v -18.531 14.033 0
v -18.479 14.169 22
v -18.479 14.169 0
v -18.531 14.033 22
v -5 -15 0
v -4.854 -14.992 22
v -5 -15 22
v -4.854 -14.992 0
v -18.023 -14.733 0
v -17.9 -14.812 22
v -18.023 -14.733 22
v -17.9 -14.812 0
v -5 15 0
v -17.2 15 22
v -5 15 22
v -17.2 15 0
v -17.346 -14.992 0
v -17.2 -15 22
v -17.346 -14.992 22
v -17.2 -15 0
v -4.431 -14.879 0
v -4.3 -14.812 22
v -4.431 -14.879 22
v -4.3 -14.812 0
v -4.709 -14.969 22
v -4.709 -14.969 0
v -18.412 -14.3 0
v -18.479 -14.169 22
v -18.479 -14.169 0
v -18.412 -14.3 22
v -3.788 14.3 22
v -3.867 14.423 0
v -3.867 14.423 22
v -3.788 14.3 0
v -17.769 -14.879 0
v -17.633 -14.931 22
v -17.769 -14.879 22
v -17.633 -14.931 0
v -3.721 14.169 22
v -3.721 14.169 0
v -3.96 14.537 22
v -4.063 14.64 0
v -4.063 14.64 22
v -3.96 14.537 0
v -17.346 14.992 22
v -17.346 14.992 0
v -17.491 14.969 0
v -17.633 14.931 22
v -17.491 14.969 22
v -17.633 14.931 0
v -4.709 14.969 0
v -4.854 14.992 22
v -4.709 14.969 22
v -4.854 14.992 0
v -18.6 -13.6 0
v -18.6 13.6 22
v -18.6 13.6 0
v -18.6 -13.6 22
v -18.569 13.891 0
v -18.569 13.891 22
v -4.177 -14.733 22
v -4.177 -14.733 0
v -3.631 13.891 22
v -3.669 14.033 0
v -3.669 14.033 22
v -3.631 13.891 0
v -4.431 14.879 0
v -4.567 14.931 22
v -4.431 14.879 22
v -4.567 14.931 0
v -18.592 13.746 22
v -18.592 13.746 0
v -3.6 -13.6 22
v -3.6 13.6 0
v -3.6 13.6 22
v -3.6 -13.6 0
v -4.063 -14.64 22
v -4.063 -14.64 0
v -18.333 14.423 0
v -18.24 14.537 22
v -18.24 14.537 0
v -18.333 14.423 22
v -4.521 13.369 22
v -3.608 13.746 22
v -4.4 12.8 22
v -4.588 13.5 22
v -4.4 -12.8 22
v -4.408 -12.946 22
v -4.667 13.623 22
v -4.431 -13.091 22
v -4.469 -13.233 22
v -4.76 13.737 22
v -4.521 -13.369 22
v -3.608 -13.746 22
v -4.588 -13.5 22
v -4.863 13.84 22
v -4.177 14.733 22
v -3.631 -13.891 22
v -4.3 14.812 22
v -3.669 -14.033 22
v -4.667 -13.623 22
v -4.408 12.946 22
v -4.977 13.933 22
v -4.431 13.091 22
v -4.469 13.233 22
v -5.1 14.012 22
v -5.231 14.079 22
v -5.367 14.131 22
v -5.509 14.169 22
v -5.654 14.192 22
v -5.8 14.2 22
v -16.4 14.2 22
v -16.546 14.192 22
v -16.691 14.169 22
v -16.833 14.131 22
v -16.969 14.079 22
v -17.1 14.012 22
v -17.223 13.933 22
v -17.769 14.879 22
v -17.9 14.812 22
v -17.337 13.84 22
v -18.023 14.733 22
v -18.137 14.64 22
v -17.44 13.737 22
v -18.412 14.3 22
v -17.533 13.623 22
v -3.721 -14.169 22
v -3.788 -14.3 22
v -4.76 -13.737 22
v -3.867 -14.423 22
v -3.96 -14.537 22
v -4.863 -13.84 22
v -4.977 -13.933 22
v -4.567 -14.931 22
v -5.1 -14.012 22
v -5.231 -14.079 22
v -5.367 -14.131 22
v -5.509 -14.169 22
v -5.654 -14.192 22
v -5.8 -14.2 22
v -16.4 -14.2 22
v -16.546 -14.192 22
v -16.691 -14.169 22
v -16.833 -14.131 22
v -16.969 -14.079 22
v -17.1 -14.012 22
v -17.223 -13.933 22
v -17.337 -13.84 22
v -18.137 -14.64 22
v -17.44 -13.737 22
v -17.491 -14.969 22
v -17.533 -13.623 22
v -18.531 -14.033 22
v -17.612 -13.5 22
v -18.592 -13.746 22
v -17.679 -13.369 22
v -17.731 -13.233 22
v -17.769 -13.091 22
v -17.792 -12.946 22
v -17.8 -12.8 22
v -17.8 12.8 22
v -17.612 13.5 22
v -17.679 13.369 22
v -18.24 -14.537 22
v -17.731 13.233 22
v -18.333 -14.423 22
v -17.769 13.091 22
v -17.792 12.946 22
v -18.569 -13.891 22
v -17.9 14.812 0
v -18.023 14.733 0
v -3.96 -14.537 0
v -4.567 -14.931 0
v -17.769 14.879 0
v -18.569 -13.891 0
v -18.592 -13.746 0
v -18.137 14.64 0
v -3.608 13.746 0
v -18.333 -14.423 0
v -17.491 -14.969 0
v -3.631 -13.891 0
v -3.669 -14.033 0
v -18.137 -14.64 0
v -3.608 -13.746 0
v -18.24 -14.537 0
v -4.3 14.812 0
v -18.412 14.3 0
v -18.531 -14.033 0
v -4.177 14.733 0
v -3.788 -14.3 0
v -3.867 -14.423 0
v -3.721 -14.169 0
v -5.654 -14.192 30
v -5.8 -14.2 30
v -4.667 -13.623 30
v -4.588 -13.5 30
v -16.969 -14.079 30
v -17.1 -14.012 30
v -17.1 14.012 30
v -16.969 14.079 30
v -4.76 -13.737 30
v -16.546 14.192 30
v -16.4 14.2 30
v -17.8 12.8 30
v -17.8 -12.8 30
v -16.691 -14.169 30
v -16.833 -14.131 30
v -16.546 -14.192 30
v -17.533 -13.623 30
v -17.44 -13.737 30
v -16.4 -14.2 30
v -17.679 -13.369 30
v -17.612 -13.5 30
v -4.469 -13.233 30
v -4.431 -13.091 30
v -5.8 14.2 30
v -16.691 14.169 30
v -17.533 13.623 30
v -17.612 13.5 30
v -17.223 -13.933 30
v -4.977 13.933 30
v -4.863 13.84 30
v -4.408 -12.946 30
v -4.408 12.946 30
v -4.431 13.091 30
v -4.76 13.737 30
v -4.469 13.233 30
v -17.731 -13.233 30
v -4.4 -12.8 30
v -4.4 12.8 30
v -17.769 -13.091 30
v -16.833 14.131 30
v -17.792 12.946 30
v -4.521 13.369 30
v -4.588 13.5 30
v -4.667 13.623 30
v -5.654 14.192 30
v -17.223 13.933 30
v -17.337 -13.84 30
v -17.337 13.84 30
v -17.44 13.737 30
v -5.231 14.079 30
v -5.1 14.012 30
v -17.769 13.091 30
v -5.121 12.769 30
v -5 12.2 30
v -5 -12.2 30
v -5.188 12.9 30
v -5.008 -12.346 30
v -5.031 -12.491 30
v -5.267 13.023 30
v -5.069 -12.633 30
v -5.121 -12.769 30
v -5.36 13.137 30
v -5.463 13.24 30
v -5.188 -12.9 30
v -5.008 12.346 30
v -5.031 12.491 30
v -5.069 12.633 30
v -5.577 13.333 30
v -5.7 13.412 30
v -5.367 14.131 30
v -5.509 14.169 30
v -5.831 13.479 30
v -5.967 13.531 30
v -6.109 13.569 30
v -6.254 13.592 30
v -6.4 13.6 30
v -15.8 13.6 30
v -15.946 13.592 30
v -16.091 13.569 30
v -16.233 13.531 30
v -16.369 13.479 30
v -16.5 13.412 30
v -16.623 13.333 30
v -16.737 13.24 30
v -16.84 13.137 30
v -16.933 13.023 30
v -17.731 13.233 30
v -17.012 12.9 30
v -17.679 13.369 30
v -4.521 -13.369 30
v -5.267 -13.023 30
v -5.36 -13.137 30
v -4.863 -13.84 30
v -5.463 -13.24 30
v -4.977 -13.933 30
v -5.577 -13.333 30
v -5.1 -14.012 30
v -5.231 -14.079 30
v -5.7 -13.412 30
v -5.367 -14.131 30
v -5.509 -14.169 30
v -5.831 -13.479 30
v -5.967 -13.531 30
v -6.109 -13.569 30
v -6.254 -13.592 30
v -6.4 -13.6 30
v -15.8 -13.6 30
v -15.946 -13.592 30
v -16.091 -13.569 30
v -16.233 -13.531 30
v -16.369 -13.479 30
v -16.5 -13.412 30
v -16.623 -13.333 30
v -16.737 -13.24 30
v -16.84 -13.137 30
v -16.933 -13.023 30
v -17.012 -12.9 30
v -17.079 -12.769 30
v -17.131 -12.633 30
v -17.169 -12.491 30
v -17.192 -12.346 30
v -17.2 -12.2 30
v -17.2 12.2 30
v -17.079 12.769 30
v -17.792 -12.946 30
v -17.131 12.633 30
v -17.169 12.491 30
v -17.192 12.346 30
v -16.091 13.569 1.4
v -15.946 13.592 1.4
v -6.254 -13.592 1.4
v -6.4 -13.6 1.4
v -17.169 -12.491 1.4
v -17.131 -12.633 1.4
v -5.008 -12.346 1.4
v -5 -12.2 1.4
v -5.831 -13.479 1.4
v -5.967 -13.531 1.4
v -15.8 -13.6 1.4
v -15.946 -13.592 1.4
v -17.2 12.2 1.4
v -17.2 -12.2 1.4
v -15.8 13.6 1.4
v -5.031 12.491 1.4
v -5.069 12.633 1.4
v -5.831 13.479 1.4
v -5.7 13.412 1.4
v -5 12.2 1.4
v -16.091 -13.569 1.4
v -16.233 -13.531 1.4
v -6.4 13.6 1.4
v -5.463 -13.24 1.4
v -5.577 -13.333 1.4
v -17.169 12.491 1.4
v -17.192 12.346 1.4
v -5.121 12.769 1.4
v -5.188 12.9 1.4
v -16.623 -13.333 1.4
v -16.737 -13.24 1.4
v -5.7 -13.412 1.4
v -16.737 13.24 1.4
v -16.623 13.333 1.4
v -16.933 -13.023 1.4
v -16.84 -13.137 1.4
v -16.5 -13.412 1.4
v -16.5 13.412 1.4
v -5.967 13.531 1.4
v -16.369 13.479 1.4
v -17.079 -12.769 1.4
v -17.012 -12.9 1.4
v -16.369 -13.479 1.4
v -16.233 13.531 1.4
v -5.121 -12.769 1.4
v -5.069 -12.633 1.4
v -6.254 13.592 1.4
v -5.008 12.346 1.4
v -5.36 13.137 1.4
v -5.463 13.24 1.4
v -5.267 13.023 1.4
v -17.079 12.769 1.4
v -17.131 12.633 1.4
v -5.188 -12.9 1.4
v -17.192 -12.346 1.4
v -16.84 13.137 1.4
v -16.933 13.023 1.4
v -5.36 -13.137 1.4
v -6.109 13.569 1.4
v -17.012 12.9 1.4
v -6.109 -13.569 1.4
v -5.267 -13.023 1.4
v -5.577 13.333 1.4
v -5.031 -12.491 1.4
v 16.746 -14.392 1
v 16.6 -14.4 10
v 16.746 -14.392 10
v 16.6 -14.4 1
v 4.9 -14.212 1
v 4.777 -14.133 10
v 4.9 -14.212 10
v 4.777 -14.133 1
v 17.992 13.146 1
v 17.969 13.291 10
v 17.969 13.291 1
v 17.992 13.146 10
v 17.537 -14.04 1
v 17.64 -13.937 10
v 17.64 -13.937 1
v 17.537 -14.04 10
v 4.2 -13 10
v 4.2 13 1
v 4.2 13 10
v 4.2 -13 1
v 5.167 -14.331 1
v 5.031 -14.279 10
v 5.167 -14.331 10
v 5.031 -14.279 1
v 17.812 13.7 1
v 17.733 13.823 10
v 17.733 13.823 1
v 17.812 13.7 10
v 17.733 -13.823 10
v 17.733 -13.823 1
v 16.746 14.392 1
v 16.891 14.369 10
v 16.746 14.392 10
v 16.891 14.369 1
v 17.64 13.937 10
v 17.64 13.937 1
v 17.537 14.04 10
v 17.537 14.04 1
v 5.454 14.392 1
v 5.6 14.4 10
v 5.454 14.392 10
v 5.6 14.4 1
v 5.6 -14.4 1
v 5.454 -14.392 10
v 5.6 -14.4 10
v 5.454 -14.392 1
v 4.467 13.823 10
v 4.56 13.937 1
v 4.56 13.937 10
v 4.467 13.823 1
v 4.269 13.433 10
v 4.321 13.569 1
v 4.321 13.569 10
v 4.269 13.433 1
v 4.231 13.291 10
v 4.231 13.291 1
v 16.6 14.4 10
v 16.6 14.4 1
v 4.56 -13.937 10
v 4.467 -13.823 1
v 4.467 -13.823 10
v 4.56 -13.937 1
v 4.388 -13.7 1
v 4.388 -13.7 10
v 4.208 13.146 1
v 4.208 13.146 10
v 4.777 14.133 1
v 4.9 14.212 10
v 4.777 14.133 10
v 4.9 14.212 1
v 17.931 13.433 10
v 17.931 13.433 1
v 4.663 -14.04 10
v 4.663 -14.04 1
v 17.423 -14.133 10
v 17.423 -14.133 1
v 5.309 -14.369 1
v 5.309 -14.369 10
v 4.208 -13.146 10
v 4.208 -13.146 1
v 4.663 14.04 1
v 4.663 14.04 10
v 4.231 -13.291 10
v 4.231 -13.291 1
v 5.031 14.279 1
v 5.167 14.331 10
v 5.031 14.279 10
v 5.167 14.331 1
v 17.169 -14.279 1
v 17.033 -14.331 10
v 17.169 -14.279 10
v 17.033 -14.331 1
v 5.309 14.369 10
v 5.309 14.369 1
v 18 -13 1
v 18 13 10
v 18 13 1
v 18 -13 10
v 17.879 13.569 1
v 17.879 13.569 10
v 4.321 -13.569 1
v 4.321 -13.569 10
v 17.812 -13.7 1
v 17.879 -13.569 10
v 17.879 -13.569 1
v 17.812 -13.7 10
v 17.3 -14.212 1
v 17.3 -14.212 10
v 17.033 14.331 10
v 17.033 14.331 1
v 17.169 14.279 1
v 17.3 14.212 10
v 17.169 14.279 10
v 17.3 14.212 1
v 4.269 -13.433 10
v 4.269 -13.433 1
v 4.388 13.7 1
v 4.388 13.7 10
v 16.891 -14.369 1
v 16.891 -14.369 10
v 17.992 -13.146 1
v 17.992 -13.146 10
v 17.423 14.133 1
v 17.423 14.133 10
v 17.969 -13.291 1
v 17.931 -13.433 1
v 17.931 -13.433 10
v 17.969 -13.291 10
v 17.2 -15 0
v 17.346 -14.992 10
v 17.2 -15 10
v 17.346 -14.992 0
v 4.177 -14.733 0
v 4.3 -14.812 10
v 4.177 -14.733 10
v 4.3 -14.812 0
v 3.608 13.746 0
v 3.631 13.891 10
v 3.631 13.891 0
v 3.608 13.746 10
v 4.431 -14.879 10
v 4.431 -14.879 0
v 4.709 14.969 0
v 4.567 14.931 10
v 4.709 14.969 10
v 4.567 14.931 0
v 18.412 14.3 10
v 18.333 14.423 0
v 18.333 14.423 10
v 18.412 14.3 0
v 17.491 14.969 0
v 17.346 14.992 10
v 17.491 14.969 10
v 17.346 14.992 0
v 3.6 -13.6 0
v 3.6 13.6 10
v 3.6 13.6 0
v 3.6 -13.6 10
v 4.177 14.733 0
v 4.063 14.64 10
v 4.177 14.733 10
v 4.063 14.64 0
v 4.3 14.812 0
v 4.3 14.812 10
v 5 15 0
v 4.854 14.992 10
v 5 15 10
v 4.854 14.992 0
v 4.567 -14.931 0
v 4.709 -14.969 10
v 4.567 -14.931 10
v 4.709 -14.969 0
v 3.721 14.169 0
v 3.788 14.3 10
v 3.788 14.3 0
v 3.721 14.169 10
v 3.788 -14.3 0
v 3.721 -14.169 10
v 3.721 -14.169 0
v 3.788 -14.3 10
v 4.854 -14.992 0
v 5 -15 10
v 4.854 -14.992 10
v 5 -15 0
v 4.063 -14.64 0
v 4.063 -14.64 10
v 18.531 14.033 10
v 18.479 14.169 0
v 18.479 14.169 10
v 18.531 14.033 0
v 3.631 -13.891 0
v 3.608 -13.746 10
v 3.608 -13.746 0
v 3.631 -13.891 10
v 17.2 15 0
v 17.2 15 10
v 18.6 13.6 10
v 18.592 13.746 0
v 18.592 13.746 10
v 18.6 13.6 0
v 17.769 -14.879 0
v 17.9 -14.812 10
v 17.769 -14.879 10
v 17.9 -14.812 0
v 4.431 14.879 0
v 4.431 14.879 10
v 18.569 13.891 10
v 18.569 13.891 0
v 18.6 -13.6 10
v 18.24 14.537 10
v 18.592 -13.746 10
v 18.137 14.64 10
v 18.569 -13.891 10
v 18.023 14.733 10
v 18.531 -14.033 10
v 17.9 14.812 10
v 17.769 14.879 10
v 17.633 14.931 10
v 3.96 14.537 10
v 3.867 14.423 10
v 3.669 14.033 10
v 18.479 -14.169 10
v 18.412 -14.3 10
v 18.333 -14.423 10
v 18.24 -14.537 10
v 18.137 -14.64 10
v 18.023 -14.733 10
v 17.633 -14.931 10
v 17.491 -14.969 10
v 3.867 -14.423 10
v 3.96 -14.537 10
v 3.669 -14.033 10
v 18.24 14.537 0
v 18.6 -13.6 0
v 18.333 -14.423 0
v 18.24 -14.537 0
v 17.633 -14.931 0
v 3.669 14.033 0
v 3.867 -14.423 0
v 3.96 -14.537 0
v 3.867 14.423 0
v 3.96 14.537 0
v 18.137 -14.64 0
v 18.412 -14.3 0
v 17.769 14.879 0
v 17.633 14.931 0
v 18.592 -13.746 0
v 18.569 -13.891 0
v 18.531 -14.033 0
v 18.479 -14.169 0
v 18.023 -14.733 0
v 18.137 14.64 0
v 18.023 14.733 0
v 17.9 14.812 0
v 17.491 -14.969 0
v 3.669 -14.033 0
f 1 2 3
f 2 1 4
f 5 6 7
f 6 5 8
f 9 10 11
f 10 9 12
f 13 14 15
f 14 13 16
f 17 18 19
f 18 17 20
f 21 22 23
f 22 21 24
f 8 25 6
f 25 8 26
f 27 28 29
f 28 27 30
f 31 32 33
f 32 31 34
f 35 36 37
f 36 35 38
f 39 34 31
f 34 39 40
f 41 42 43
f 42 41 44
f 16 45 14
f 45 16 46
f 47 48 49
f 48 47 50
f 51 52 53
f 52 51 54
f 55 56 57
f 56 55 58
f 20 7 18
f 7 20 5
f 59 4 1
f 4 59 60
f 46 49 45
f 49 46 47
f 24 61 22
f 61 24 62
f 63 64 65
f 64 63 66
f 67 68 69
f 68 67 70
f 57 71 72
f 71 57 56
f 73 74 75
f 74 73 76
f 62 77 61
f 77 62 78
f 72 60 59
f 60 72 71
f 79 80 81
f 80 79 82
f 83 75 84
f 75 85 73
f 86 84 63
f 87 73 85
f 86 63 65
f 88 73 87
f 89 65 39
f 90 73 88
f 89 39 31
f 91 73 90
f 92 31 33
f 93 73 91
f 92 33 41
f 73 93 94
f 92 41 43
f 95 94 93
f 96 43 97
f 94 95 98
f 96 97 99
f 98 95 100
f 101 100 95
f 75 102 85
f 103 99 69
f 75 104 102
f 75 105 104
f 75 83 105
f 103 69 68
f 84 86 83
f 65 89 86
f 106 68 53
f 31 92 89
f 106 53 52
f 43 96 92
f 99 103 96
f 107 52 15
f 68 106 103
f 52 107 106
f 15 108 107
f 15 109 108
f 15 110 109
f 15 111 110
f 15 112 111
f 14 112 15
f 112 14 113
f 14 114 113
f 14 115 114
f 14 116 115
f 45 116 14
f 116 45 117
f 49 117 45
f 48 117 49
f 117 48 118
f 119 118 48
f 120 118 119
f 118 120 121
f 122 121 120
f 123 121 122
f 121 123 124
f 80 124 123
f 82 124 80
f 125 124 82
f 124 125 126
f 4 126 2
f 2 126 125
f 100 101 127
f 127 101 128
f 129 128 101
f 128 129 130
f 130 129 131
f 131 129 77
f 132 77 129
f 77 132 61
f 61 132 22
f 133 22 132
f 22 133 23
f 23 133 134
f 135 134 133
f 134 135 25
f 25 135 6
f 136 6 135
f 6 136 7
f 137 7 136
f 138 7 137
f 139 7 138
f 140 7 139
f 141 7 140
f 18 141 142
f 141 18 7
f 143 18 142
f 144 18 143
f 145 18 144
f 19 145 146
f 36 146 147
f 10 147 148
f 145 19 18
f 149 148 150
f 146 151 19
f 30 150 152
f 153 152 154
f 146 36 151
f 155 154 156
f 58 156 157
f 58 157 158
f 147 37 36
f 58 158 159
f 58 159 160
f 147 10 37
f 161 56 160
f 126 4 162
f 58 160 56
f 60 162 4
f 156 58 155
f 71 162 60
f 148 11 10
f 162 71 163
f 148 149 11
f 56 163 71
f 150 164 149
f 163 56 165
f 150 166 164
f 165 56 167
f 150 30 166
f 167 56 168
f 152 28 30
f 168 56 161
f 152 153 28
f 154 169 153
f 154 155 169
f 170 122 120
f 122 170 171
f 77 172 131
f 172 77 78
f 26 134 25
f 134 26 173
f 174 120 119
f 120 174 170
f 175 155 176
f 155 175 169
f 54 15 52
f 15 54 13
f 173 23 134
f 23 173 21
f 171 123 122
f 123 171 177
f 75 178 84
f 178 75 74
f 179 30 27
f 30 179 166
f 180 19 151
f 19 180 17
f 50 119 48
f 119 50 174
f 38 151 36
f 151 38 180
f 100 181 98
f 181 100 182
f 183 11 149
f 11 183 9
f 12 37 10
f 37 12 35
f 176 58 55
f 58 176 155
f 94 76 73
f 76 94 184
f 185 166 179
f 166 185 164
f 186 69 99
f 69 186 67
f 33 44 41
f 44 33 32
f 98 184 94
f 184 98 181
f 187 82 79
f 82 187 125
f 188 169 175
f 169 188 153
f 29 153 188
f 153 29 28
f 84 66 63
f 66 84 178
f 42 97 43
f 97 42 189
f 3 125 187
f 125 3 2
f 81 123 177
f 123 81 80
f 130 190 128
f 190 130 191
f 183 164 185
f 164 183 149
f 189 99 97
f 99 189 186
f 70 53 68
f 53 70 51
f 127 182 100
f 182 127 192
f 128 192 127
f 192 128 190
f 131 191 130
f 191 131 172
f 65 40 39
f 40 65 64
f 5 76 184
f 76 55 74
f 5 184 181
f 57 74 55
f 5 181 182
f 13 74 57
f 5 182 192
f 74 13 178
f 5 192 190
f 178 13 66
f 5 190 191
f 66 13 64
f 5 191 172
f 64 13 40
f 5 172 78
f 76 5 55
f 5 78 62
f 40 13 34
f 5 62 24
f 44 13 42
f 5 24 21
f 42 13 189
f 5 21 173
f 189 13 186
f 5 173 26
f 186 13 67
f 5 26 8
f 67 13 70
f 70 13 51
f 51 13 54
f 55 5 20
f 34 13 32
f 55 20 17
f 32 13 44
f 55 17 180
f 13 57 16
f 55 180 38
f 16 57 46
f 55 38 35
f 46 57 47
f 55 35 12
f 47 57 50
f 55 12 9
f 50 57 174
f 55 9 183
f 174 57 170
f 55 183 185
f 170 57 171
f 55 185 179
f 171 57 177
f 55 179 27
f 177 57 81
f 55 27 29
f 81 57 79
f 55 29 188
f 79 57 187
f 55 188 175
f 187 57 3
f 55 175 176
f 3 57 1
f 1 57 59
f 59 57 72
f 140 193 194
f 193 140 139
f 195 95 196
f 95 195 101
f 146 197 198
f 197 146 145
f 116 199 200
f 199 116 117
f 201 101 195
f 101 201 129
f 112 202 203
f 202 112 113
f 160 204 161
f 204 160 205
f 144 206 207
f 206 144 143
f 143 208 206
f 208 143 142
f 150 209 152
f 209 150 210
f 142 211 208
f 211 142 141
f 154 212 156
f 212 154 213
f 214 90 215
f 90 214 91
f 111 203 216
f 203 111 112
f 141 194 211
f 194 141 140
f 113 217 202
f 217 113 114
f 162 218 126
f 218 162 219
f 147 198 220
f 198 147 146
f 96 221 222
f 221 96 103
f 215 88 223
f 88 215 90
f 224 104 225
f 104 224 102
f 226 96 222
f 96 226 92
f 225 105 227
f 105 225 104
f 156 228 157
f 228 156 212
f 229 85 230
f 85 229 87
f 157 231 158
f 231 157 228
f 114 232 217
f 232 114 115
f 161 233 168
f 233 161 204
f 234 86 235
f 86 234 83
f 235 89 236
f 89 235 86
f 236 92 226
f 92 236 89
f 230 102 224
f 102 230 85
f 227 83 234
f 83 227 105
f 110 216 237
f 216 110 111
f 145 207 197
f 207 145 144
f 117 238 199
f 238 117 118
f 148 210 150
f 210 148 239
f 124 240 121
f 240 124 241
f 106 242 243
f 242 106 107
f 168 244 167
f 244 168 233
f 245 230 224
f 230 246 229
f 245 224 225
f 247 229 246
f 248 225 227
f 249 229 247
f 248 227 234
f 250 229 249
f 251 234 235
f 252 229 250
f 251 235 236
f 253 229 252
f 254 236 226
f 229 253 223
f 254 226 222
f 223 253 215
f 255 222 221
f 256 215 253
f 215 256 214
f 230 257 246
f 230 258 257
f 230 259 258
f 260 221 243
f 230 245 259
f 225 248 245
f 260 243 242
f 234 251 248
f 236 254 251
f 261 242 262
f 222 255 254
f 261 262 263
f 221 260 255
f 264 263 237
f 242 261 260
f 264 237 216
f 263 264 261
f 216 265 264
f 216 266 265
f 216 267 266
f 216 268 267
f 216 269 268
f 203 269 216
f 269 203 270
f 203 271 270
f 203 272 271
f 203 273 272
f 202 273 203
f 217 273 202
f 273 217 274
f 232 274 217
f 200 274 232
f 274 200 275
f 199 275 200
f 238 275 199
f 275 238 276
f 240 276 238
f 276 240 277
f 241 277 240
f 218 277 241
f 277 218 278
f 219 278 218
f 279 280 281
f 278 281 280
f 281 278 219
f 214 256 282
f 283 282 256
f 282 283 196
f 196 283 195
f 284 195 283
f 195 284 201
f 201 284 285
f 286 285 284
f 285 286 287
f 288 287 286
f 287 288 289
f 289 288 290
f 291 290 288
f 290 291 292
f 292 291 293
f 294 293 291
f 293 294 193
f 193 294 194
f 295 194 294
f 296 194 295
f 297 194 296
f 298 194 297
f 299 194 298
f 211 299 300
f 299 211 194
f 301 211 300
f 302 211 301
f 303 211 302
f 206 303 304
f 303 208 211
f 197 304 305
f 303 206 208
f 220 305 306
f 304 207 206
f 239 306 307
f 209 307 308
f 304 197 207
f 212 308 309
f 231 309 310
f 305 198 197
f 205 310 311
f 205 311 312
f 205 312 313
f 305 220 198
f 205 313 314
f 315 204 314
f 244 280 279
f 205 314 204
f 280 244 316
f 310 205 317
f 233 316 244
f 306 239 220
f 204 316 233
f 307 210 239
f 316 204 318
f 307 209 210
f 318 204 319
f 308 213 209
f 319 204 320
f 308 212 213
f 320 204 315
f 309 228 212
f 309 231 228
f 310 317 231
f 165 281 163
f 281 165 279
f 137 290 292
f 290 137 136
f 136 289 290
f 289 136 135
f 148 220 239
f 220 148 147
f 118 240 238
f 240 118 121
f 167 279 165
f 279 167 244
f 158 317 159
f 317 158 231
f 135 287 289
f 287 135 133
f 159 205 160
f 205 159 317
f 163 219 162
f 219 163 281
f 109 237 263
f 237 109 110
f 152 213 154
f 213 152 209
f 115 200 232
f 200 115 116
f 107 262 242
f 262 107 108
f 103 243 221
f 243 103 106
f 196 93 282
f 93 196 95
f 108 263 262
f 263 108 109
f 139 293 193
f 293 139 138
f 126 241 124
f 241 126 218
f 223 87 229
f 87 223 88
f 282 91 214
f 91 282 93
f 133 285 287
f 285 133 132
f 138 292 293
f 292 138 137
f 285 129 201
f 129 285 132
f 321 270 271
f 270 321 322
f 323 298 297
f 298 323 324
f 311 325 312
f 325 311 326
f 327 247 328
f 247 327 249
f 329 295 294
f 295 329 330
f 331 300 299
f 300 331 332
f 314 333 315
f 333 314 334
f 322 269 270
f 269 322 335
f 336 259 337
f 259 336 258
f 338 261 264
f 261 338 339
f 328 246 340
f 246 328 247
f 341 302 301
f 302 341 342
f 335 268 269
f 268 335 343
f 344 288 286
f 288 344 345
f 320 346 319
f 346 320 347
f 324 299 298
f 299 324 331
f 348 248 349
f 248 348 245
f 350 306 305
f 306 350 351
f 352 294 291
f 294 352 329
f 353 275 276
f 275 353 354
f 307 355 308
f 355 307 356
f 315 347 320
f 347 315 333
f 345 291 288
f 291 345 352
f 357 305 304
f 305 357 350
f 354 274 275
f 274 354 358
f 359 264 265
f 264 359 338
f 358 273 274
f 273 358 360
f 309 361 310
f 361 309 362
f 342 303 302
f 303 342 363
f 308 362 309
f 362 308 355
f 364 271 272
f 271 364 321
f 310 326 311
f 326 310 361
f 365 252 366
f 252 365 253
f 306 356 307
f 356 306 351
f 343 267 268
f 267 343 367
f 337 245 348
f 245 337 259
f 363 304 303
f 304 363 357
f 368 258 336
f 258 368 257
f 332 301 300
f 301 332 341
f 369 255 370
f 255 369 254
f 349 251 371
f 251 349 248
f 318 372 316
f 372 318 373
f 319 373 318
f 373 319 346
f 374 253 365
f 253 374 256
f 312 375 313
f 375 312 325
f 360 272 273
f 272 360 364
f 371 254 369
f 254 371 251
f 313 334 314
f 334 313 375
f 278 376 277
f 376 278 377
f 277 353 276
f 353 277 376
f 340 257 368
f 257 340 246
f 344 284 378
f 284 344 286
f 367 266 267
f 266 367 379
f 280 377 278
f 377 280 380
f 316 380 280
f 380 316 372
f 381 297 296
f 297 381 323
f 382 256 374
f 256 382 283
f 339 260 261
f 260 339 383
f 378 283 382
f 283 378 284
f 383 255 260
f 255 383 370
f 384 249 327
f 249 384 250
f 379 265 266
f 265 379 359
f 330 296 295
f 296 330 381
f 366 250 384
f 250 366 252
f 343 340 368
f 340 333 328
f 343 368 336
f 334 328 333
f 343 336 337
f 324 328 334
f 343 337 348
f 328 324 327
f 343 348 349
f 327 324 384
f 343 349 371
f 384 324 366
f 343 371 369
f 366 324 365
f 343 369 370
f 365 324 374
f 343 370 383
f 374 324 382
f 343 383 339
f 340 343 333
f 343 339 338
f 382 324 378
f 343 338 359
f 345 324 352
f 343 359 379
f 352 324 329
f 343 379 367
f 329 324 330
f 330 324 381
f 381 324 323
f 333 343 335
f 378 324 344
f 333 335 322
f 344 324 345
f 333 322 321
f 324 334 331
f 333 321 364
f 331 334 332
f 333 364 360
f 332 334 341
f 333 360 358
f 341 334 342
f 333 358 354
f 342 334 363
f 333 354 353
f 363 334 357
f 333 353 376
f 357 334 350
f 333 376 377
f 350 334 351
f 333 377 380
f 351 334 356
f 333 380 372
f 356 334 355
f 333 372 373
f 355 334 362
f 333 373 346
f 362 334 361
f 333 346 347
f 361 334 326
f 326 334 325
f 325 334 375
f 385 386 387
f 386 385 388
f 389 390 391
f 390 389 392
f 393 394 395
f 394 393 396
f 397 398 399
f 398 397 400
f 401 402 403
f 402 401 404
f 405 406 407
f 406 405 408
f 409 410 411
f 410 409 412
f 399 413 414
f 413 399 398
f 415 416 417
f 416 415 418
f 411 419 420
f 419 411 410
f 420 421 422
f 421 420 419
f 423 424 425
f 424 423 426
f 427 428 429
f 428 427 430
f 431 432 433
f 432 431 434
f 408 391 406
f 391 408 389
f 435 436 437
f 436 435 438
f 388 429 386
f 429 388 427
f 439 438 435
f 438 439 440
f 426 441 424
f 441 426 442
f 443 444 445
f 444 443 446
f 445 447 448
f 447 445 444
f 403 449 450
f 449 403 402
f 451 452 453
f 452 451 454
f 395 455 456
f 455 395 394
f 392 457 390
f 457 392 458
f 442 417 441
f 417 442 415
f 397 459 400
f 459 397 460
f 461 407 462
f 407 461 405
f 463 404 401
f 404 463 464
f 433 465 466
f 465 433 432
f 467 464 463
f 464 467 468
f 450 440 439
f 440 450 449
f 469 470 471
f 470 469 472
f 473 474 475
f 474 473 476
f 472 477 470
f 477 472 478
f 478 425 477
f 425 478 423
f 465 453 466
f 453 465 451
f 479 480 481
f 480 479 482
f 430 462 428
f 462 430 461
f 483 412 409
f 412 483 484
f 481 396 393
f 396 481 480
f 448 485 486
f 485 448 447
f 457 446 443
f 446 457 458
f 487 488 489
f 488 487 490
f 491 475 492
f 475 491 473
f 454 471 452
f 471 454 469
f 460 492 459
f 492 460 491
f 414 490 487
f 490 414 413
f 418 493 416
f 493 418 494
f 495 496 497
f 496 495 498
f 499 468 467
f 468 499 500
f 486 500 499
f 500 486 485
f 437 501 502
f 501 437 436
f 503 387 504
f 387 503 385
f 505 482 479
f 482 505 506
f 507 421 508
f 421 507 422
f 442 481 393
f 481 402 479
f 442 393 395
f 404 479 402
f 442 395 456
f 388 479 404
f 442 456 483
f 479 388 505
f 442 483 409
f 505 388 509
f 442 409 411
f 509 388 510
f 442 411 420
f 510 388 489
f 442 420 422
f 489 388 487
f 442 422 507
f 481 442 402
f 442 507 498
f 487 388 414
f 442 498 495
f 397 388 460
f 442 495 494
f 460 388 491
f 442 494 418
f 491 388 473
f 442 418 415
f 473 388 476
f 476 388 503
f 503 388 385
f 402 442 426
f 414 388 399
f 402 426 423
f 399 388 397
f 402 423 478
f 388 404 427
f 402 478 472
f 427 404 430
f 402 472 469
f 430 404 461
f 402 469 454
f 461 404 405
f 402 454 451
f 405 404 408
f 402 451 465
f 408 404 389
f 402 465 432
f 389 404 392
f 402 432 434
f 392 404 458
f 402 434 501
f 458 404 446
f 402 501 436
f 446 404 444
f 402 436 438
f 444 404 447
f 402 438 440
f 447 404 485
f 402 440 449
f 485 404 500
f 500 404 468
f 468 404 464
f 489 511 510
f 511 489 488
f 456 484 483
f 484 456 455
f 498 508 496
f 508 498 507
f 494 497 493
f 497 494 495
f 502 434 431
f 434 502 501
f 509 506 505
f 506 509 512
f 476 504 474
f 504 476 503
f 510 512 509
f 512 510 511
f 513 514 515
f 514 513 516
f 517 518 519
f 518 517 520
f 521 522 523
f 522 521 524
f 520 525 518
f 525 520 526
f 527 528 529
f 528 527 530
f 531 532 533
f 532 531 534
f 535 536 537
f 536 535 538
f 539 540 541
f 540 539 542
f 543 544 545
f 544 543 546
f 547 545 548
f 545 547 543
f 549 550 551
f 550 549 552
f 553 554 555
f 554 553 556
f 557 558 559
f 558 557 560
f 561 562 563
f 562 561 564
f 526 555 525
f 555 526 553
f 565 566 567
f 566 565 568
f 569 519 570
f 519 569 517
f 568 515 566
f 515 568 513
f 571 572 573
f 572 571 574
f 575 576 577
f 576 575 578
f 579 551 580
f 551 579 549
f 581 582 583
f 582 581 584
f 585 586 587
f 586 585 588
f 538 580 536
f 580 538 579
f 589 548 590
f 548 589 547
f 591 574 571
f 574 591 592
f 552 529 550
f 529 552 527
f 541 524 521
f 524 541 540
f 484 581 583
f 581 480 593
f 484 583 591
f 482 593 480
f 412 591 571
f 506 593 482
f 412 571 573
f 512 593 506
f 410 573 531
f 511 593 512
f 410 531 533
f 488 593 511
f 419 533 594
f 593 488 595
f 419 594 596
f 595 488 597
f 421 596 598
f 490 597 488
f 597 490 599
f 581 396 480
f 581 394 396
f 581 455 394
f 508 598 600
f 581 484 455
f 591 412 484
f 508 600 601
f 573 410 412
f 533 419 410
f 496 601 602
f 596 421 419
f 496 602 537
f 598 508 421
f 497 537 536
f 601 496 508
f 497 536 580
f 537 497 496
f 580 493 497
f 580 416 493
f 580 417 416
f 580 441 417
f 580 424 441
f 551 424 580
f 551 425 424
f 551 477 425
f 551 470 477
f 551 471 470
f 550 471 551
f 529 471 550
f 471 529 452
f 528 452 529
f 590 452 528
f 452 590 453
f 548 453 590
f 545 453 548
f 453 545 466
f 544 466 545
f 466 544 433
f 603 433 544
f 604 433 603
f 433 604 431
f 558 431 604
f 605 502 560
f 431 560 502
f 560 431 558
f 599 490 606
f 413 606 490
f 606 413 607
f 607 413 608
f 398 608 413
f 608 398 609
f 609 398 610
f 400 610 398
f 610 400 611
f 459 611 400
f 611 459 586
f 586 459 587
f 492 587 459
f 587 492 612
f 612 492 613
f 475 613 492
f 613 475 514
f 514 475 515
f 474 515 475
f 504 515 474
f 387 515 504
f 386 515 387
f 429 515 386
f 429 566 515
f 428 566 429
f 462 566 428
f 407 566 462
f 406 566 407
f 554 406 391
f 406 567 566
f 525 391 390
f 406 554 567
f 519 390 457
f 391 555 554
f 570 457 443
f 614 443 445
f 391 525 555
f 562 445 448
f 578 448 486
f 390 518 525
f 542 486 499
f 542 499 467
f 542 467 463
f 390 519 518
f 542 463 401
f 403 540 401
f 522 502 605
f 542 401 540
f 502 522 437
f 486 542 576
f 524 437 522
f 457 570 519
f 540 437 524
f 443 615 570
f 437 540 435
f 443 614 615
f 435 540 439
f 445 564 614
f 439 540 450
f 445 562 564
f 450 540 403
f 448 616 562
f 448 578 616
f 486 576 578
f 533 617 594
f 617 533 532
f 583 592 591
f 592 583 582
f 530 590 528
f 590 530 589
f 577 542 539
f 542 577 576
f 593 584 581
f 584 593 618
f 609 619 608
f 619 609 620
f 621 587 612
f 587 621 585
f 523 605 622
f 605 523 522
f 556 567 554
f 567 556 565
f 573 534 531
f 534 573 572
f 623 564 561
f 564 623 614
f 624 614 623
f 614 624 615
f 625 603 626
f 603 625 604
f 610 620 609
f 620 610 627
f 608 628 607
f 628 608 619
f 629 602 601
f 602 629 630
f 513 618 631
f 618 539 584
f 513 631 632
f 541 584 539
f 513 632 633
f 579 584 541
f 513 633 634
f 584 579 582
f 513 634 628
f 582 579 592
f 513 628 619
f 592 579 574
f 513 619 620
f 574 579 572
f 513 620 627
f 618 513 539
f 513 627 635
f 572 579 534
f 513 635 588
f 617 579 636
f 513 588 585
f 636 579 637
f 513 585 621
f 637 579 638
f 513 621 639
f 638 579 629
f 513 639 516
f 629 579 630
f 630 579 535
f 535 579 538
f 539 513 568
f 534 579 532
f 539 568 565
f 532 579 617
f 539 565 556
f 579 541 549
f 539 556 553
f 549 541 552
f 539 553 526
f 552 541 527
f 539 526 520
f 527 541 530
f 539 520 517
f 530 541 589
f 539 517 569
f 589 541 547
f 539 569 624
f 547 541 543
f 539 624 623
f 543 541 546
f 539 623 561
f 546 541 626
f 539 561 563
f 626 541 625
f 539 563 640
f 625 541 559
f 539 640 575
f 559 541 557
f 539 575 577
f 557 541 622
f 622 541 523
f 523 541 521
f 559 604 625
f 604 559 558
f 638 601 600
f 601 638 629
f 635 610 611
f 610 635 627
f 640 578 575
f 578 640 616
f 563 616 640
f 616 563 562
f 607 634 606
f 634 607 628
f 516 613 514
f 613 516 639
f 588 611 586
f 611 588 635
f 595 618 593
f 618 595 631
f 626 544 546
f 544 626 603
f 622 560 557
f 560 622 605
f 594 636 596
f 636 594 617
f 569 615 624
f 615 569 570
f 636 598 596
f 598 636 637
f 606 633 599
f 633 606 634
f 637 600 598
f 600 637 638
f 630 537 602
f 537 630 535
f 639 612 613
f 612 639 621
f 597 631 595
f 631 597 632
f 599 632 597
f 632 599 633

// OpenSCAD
// Outer box width
outerWidth = 15;

// Outer box depth
outerDepth = 30;

// Outer total box height
outerHeight = 32;

// Lid height
lidHeight = 10;

// Number of vertical spaces
numSeparatorsX = 1; // [1:20]

// Number of horizontal spaces
numSeparatorsY = 1; // [1:20]

// Outer wall thickness
outerWallThickness = 1.4;

// Show parts
showParts = 0; // [0:All, 1:Base, 2:Lid]

// Tolerance
tolerance = 0.1;

/* [Hidden] */
wt = outerWallThickness;
boxWidth = outerWidth-2*wt;
boxDepth = outerDepth-2*wt;
boxHeight = outerHeight;

$fn=60;
il=9;
iw=wt/2-tolerance;

if (showParts != 2) {
translate([-boxWidth/2-5, 0, 0]) {
    box_base(boxWidth, boxDepth, boxHeight, lidHeight);
    separators(numSeparatorsX, numSeparatorsY , boxWidth, boxDepth, boxHeight-lidHeight+il-1);
}
}

if (showParts != 1) {
translate([boxWidth/2+5, 0, 0])
box_lid(boxWidth, boxDepth, lidHeight);
}

module separators (nx, ny, sizeX, sizeY, height) {
    xS = sizeX / nx;
    yS = sizeY / ny;
    union(){
        if ( nx > 1) {
            for ( a = [0 : nx-2] ) {
                translate([-sizeX/2+xS*(a+1), 0, 0])
                    linear_extrude(height=height)
                    square([iw, sizeY], center = true);
            }
        }
        if ( ny > 1) {
            for ( b = [0 : ny-2] ) {
                translate([0, -sizeY/2+yS*(b+1), 0])
                    linear_extrude(height=height)
                    square([sizeY, iw], center = true);
            }
        }
    }

}


module box_lid (width, depth, height) {
    difference() {
        
        linear_extrude(height=height) {
        offset(wt)
        square([width, depth], center = true);
        }
    
        union() {
            translate([0, 0, height-il])
            linear_extrude(height=il+1) {
            offset(wt)
             square([width-2*iw, depth-2*iw], center = true);
            }

            translate([0, 0, wt])
            linear_extrude(height=height-wt+1) {
            offset(wt)
             square([width-2*wt, depth-2*wt], center = true);
            }
        }
    }    
}

module box_base(width, depth, height, lid) {
    difference(){
        union(){
            linear_extrude(height=height-lid) {
            offset(wt)
            square([width, depth], center = true);
            }

            linear_extrude(height=height-lid+il-1)
            offset(wt)
            square([width-2*wt+2*iw, depth-2*wt+2*iw], center = true);
        }

        translate([0, 0, wt])
        linear_extrude(height=height-lid+il)
        offset(wt)
        square([width-2*wt, depth-2*wt], center = true);
    }
}
